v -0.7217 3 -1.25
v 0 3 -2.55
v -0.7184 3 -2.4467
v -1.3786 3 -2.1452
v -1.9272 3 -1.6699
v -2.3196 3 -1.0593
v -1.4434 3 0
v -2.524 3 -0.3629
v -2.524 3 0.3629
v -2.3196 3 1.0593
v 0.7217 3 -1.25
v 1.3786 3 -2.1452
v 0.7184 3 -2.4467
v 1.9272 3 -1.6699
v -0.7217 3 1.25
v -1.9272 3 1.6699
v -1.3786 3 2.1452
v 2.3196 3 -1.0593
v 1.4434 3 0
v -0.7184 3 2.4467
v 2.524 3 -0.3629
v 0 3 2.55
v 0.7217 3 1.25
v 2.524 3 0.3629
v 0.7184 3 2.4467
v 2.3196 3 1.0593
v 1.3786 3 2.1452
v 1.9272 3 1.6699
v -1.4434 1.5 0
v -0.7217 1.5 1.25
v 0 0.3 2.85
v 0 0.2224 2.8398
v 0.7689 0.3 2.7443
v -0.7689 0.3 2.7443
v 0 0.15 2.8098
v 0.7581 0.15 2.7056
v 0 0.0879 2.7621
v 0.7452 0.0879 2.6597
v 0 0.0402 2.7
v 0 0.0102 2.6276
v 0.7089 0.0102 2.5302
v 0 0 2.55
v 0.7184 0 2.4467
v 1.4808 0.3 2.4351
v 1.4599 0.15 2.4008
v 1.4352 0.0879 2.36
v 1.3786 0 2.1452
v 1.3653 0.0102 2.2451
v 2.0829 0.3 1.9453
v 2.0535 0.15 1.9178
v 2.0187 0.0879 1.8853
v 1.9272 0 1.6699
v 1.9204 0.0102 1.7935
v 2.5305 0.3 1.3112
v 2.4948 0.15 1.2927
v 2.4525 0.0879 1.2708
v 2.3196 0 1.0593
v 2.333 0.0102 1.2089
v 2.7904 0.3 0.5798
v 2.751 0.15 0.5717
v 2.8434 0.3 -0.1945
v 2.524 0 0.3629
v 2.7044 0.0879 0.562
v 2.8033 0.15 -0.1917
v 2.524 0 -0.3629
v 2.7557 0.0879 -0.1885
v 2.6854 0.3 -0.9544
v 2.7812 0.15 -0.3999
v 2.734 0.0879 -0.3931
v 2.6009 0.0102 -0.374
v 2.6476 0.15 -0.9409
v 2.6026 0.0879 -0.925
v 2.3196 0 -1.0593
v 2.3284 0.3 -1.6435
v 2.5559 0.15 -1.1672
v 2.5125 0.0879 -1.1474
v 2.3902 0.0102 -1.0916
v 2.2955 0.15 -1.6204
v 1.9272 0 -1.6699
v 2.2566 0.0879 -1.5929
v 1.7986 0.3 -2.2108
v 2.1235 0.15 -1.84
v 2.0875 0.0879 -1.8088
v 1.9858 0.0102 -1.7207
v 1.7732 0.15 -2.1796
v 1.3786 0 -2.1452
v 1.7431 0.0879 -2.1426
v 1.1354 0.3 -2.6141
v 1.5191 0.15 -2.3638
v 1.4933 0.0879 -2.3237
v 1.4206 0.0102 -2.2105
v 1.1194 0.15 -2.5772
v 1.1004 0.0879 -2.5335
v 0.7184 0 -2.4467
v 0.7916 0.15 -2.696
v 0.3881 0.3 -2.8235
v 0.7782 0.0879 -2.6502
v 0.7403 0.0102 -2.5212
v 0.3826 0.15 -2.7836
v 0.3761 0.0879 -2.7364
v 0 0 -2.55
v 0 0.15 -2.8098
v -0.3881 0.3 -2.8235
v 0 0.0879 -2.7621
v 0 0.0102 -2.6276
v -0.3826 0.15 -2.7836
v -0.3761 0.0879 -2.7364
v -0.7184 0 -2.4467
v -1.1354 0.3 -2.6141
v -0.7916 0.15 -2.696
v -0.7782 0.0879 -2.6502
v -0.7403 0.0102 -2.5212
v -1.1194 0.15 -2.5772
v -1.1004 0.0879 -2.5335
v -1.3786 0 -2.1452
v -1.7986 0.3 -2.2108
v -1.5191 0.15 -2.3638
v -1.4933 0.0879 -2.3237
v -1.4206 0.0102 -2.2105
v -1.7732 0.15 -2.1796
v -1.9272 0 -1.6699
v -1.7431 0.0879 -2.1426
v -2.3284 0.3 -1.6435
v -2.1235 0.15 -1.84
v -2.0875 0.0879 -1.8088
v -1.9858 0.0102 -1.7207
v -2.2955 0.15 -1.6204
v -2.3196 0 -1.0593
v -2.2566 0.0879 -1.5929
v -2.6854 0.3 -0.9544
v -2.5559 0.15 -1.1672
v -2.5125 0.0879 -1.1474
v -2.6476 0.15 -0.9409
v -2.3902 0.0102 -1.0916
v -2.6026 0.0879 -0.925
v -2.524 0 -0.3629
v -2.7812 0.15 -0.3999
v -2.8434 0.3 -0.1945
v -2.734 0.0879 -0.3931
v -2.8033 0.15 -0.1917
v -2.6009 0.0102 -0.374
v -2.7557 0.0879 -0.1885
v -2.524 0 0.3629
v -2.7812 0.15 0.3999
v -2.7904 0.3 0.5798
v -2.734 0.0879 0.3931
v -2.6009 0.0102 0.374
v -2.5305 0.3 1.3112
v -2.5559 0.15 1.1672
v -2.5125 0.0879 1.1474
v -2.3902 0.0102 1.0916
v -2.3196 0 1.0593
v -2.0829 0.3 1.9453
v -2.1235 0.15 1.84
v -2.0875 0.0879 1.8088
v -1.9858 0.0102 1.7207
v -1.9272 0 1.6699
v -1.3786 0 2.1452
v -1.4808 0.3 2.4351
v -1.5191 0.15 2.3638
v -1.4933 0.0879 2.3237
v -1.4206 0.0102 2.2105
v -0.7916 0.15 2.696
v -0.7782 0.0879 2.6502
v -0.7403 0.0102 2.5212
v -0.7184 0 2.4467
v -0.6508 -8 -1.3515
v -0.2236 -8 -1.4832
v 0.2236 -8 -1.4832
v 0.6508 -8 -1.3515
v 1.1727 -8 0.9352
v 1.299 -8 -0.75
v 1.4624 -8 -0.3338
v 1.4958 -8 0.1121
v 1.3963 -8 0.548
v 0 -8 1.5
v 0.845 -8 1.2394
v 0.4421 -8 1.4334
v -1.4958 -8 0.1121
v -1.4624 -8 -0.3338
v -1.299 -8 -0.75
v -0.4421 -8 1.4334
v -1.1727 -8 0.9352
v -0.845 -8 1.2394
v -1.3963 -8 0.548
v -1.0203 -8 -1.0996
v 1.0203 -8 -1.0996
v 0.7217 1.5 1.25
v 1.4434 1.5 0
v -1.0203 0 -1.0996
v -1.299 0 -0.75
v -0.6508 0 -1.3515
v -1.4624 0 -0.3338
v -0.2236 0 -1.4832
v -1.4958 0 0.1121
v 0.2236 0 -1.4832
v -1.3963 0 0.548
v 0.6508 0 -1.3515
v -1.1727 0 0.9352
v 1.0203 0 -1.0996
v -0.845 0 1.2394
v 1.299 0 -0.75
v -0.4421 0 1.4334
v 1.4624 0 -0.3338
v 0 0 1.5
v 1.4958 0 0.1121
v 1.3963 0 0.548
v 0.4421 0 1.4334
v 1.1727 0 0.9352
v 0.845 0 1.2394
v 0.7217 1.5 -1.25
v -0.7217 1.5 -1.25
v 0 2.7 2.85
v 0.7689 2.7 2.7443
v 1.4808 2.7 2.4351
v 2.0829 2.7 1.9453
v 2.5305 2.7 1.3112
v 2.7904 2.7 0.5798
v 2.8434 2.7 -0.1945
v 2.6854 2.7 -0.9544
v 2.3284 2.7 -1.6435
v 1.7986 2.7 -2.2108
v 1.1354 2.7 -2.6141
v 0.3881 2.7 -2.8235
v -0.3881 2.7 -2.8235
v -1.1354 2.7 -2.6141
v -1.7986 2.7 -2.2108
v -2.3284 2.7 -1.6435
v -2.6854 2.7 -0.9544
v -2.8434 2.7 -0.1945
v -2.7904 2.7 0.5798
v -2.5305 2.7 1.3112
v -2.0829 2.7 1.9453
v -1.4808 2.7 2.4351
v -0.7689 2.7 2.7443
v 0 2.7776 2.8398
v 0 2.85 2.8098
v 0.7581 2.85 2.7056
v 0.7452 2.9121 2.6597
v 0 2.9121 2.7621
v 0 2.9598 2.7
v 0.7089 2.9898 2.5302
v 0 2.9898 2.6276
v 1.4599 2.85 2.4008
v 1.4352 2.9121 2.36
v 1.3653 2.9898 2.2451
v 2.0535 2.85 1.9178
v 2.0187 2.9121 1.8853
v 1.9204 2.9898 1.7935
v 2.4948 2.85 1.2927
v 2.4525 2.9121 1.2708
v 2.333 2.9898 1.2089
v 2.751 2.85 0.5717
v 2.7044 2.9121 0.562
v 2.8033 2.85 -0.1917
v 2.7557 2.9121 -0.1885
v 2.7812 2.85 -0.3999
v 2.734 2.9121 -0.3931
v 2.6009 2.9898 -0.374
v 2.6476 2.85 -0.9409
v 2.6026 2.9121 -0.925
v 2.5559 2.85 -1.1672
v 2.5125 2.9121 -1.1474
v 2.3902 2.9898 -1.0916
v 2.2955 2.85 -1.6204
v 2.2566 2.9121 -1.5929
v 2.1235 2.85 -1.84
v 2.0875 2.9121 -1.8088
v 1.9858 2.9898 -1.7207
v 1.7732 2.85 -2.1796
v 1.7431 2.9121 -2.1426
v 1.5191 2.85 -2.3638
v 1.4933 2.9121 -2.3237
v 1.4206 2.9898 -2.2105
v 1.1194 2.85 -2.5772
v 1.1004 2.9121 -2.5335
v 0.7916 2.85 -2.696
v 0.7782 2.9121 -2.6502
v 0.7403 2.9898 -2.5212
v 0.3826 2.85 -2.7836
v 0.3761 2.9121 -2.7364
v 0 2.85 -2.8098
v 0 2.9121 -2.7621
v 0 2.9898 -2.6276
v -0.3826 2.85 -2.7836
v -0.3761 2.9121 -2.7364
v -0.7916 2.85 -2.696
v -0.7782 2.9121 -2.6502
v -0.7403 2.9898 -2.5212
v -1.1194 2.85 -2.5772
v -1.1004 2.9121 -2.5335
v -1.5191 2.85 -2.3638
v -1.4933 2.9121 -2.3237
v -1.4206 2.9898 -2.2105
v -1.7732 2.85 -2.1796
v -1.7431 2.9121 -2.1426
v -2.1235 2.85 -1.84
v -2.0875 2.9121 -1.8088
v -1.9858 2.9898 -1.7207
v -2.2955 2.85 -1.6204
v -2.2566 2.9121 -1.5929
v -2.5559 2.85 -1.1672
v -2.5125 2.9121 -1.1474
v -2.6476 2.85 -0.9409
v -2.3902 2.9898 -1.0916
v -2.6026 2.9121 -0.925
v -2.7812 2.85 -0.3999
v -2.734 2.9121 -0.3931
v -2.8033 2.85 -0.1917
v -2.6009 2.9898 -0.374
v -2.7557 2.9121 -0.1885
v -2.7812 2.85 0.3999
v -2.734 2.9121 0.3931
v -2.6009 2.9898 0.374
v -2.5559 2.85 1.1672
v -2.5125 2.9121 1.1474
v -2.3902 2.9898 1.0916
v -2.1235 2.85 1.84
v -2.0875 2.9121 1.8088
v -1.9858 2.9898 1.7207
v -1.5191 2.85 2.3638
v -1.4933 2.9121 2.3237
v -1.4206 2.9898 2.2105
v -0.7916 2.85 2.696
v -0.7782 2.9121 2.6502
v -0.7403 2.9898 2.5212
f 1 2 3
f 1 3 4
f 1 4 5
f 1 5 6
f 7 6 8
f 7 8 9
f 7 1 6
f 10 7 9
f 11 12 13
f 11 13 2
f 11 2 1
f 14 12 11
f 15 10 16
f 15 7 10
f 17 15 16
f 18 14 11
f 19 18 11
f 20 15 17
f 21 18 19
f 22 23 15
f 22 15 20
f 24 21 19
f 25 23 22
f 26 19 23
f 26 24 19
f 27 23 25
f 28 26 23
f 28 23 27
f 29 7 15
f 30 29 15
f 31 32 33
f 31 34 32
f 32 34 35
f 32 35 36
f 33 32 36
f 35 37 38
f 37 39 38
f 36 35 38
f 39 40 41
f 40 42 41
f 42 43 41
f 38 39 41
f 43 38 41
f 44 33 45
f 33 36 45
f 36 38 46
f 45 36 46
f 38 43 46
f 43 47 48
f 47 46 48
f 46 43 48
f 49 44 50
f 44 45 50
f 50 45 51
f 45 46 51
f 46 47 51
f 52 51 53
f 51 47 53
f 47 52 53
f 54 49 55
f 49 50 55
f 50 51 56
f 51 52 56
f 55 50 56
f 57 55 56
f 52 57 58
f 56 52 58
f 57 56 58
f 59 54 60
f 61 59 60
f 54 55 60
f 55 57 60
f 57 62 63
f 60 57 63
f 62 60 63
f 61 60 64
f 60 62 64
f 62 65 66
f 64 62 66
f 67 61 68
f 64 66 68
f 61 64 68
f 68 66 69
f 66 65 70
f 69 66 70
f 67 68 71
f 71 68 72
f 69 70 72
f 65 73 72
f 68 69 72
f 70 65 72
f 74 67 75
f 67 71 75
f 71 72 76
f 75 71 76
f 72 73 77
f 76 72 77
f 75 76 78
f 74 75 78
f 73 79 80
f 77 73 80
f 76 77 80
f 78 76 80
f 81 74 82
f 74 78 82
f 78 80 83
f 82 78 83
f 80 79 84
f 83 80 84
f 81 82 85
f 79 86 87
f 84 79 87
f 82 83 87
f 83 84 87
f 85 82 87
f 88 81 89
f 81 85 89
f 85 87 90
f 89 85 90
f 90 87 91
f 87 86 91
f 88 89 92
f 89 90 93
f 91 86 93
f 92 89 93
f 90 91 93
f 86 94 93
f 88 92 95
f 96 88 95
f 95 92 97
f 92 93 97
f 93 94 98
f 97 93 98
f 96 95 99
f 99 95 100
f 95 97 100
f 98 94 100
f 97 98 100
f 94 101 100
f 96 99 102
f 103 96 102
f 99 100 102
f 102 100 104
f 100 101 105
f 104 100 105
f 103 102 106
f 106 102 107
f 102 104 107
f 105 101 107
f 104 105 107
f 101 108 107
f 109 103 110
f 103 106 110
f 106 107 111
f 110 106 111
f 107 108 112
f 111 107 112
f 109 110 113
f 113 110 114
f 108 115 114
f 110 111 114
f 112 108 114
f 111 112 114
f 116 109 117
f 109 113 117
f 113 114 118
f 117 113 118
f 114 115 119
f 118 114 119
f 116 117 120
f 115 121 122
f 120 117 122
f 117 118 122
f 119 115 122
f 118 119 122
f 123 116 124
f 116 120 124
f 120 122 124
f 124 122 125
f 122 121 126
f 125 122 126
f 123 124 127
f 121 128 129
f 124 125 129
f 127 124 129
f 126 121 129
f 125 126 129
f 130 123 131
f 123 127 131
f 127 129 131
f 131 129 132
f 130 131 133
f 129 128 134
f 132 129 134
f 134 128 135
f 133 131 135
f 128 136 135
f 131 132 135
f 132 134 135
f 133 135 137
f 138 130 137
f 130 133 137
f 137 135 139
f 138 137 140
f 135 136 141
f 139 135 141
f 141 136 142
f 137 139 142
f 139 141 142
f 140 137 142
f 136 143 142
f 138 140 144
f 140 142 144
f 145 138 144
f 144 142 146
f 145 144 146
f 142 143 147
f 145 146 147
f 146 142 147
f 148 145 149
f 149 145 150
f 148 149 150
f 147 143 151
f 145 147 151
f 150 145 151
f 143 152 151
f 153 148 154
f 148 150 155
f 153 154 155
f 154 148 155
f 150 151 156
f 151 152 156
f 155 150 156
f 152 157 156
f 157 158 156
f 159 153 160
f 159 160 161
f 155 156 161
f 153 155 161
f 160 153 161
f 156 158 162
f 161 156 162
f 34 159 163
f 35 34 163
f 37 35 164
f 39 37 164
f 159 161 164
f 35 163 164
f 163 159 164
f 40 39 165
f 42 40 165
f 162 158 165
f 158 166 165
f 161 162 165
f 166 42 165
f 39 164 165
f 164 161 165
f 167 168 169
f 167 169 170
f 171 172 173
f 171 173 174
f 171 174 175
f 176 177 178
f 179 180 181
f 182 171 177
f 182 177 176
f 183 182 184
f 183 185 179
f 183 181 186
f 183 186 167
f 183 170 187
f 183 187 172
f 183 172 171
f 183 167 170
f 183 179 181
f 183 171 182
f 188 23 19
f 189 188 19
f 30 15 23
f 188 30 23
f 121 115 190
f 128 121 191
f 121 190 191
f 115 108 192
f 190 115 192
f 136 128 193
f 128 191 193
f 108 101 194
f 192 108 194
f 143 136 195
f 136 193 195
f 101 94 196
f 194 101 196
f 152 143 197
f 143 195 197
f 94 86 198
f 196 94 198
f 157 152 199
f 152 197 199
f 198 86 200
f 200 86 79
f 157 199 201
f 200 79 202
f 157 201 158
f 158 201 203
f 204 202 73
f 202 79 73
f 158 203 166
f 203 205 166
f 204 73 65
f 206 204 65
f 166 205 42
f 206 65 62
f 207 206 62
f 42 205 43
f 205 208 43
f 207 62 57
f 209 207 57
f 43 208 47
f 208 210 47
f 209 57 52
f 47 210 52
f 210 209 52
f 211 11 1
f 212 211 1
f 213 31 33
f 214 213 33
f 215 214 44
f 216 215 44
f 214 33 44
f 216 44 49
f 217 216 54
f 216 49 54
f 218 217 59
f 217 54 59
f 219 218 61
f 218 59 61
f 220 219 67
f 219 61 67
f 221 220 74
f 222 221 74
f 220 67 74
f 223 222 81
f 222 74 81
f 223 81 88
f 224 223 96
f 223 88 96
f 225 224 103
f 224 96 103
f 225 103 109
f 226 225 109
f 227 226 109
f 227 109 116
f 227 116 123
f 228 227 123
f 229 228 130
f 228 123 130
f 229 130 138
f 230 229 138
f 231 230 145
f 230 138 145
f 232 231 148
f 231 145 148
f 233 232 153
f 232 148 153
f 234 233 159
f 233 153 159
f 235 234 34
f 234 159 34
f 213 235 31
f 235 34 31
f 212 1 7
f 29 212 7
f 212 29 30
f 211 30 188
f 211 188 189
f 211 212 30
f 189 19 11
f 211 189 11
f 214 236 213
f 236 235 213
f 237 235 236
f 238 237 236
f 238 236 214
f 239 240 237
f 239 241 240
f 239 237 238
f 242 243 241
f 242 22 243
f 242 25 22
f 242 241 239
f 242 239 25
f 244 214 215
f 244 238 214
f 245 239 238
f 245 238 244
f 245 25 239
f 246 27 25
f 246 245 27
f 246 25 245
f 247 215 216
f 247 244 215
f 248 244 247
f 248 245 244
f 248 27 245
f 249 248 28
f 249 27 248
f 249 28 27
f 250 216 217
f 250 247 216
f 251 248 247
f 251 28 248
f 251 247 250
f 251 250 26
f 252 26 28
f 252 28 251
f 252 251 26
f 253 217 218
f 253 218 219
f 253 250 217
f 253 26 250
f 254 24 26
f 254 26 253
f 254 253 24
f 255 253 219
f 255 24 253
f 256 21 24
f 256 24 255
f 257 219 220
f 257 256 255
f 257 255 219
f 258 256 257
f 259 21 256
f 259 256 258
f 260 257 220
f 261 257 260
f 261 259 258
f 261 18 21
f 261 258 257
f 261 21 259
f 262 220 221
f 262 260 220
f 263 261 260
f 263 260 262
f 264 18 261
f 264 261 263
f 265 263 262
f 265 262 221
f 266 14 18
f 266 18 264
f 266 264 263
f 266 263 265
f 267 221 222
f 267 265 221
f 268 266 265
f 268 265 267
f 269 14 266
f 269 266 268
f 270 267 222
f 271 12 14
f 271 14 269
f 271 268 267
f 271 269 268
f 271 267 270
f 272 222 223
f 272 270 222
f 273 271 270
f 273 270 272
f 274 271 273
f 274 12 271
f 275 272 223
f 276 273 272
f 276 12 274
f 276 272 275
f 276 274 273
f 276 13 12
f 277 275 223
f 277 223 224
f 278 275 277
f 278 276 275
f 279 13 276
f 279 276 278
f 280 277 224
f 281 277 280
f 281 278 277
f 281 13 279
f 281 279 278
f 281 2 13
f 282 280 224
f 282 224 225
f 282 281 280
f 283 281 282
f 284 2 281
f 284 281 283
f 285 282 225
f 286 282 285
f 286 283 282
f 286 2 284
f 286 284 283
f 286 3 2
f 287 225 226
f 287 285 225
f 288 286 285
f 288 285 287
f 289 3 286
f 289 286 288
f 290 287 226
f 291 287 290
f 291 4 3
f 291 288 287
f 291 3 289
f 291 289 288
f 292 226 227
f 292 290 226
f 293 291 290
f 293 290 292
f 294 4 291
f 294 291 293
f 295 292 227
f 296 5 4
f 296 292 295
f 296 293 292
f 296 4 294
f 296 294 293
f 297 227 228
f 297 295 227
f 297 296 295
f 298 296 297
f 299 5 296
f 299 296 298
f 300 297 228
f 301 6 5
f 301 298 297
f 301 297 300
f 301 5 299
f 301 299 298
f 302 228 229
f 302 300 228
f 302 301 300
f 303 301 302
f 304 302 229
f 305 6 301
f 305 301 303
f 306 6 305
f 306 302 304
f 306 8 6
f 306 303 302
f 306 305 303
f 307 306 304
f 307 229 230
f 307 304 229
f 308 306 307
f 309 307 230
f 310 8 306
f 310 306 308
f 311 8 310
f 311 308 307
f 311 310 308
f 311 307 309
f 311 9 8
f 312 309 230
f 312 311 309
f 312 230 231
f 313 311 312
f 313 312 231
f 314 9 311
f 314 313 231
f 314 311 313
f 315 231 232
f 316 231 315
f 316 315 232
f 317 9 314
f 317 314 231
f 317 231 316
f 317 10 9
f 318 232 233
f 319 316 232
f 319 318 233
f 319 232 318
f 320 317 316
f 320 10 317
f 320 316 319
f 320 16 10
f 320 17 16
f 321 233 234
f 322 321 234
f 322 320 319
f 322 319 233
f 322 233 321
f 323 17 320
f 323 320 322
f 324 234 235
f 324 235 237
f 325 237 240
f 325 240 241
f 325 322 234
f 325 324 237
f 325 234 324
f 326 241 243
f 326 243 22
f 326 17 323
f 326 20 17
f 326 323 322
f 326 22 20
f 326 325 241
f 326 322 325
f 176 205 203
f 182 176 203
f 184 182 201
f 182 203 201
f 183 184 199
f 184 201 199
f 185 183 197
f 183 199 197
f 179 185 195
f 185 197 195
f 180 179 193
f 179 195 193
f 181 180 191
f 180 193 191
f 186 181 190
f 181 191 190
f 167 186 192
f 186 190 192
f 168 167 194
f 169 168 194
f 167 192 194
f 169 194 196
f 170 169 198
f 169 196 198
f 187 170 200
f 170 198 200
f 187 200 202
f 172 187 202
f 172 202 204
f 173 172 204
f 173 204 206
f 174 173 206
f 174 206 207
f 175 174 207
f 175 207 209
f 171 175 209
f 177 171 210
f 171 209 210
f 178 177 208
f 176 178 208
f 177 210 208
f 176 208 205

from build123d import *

# Parameters (mm, degrees)
SKETCH_1_R          = 2.85
EXTRUDE_1_DEPTH     = 3
SKETCH_2_R          = 1.5
EXTRUDE_2_DEPTH     = 8
FILLET_1_R          = 0.3
CUT_EXTRUDE_1_DEPTH = 1.5


with BuildPart() as part:
    # 草图1 → 凸台-拉伸1 (new body)
    with BuildSketch(Plane(origin=(0, 0, 0), x_dir=(1, 0, 0), z_dir=(0, 1, 0))):
        with Locations(Location((0, 0, 0), (0, 0, 270))):
            Circle(SKETCH_1_R)
    extrude(amount=EXTRUDE_1_DEPTH)

    # 草图2 → 凸台-拉伸2 (add)
    with BuildSketch(Plane.XZ):
        with Locations(Location((0, 0, 0), (0, 0, 90))):
            Circle(SKETCH_2_R)
    extrude(amount=EXTRUDE_2_DEPTH)

    # 圆角1
    fillet_1_edges = [part.edges().sort_by_distance(p)[0] for p in [
        (0, 0, -2.85),
        (0, 3, -2.85),
    ]]
    fillet(fillet_1_edges, radius=FILLET_1_R)

    # 草图3 → 切除-拉伸1 (cut)
    with BuildSketch(Plane(origin=(0, 3, 0), x_dir=(1, 0, 0), z_dir=(0, 1, 0))):
        Polygon((-1.443375673, 0), (-0.721687836, -1.25), (0.721687836, -1.25), (1.443375673, 0), (0.721687836, 1.25), (-0.721687836, 1.25), align=None)
    extrude(amount=-CUT_EXTRUDE_1_DEPTH, mode=Mode.SUBTRACT)


solid = part.part
